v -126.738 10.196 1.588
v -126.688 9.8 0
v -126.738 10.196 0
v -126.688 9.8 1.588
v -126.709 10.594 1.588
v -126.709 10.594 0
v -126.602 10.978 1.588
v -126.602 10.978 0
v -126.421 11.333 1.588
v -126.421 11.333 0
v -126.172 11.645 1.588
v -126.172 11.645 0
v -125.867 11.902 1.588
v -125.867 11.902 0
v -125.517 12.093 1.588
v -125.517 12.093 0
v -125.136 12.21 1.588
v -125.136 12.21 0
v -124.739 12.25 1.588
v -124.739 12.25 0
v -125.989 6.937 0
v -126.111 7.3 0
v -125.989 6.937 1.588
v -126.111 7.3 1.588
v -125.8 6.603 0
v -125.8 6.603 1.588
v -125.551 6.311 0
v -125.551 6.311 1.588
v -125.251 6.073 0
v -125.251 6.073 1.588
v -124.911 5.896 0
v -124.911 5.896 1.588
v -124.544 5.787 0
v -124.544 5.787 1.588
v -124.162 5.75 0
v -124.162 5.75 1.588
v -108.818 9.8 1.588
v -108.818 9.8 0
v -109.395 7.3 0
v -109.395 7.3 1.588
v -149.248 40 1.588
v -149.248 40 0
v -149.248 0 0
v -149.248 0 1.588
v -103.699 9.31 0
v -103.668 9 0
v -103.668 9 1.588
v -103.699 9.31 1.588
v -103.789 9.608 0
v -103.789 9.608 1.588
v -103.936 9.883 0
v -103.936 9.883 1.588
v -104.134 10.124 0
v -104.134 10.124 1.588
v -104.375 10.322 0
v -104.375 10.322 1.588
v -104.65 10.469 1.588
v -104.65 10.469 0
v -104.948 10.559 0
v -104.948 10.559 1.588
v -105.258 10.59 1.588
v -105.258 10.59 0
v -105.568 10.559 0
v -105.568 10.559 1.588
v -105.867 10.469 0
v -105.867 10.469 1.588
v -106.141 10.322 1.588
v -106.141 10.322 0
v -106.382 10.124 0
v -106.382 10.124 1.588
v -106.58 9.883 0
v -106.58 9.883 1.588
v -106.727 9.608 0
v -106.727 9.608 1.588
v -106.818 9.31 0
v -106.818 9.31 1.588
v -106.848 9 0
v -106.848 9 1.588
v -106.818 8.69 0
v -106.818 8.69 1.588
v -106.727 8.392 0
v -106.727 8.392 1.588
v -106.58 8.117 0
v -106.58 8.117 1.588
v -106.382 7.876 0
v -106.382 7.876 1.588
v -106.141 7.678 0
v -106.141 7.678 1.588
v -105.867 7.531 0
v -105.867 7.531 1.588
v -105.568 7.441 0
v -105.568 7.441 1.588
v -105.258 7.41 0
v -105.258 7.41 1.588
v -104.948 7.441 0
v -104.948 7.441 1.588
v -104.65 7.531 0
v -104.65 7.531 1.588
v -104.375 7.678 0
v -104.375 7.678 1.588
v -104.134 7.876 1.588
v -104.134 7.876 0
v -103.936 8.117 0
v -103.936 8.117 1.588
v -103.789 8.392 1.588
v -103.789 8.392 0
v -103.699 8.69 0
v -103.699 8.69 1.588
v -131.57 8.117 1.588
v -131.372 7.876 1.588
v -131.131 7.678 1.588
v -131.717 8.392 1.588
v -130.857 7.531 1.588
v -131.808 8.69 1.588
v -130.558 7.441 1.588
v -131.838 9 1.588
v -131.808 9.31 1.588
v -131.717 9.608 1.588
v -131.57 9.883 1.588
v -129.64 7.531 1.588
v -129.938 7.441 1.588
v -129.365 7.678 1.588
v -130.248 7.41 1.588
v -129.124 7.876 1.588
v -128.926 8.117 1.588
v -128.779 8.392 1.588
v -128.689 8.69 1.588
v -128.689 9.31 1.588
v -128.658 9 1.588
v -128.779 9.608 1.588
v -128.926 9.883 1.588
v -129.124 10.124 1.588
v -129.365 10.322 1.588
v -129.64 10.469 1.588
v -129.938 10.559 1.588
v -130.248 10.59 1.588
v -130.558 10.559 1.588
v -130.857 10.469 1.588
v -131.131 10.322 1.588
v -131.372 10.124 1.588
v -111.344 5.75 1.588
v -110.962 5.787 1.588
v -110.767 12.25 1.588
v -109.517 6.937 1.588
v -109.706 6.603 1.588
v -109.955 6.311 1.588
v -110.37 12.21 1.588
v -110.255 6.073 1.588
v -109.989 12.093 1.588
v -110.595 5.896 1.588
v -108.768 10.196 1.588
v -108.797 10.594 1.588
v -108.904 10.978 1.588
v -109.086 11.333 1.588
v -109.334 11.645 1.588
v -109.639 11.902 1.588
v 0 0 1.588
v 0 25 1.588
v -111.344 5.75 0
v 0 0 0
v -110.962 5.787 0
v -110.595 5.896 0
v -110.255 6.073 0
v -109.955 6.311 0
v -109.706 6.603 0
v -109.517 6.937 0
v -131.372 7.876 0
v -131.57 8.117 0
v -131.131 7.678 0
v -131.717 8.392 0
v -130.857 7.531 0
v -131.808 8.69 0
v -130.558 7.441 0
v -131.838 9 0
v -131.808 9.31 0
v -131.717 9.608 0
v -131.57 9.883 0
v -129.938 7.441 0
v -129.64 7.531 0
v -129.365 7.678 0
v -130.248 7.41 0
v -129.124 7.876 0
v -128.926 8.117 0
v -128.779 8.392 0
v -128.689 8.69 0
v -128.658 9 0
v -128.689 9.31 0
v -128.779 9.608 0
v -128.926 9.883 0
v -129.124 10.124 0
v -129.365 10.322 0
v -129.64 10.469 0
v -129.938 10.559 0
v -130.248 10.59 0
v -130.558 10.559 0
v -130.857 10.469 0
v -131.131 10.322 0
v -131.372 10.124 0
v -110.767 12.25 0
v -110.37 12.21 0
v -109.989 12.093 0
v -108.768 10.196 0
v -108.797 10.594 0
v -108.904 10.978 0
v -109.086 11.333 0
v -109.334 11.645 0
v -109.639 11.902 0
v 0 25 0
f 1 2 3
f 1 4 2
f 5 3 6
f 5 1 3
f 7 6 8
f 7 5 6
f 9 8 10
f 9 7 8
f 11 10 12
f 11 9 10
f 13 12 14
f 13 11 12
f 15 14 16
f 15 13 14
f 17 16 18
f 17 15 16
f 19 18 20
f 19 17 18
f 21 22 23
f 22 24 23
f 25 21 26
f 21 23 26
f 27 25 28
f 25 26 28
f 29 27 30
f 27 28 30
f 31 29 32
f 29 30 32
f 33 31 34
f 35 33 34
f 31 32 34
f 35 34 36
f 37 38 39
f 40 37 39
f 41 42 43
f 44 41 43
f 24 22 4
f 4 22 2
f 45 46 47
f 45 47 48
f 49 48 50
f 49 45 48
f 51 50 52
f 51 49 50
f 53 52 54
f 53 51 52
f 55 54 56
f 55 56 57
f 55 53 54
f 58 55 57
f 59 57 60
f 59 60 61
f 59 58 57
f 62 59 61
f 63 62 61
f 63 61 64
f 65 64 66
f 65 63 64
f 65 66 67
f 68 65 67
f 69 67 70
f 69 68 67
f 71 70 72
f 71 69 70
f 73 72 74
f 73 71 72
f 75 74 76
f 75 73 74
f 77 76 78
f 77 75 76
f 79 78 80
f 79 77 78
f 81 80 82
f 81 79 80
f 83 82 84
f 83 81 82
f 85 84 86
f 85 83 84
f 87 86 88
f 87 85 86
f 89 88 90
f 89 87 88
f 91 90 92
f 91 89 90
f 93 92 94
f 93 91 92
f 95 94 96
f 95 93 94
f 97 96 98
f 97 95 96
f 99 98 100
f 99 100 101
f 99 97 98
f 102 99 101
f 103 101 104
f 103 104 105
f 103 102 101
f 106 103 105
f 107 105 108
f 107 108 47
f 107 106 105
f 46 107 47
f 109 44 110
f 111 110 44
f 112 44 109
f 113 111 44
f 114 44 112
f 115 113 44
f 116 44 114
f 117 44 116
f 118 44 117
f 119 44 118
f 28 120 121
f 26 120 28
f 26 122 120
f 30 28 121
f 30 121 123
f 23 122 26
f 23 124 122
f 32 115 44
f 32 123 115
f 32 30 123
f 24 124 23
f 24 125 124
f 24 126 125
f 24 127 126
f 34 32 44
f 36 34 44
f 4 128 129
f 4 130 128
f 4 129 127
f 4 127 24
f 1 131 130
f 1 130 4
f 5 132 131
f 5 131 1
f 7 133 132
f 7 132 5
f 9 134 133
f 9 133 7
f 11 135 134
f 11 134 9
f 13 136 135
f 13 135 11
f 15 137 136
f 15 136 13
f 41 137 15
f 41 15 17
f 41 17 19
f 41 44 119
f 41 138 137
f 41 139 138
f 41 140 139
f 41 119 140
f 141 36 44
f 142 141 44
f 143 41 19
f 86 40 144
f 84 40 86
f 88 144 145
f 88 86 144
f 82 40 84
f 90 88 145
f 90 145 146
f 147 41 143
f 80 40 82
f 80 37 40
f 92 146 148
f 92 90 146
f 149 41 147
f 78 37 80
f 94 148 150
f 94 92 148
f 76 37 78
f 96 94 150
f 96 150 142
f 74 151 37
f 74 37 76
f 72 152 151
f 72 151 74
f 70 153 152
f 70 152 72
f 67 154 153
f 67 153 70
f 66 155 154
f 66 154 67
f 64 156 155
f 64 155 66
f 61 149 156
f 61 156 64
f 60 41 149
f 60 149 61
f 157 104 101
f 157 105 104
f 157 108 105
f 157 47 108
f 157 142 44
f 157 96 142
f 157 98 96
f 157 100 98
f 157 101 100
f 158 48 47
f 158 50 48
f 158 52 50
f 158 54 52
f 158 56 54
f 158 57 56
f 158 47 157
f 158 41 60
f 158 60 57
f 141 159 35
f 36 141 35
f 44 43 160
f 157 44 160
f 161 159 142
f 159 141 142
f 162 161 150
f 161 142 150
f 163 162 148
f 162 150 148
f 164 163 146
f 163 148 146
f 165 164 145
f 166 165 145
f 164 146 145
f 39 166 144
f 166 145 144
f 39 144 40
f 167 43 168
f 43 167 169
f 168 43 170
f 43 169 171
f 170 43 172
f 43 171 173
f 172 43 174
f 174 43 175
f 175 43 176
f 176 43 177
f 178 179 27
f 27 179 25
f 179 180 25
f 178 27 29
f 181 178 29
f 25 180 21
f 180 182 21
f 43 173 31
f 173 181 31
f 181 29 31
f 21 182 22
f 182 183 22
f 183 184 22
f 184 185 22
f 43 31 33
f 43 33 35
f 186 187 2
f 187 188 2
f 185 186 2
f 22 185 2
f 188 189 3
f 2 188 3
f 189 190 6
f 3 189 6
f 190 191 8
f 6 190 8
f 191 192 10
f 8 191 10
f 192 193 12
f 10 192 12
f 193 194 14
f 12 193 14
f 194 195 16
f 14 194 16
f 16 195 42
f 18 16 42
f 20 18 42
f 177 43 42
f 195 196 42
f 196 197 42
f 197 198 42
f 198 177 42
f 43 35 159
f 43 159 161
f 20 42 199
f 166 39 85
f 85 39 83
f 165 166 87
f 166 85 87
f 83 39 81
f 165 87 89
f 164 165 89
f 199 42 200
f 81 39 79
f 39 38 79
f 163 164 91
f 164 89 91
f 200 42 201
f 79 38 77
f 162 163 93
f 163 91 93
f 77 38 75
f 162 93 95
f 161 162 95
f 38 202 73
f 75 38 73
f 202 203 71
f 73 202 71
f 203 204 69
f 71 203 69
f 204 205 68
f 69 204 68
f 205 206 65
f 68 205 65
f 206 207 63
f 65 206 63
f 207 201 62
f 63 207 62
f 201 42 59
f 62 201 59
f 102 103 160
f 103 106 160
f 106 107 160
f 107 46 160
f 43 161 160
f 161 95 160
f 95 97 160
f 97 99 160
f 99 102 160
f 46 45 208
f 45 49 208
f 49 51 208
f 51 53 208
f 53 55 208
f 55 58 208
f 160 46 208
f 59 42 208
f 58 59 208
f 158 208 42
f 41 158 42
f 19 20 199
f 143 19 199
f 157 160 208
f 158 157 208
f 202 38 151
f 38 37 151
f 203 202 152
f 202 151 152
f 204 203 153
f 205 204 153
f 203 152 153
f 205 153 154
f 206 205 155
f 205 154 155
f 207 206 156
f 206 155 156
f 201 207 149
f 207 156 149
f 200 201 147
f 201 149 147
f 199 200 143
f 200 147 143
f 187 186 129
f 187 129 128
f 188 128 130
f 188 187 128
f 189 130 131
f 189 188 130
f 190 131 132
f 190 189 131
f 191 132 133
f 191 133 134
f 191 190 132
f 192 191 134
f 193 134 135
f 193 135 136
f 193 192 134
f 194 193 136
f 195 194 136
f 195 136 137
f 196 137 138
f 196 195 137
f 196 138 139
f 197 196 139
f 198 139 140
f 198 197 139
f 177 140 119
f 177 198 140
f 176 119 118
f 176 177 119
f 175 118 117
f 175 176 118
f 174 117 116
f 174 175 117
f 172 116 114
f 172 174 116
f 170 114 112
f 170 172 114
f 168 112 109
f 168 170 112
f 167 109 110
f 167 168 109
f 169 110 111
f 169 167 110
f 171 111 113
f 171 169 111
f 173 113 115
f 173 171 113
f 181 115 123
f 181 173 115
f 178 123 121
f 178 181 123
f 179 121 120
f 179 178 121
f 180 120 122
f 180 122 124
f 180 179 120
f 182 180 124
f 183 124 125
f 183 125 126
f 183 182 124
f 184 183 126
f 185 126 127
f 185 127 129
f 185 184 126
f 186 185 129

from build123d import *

# Parameters (mm, degrees)
ESQUISSE1_R        = 1.59
BOSS_EXTRU_1_DEPTH = 1.5875
CONG_1_R           = 2


with BuildPart() as part:
    # Esquisse1 → Boss.-Extru.1 (new body)
    with BuildSketch(Plane.XY):
        Polygon((-149.248115566, 40), (-149.248115566, 0), (0, 0), (0, 25), align=None)
        with Locations((-130.248115566, 9)):
            Circle(ESQUISSE1_R, mode=Mode.SUBTRACT)
        with Locations((-105.258115566, 9)):
            Circle(ESQUISSE1_R, mode=Mode.SUBTRACT)
        Polygon((-127.253115566, 12.25), (-108.253115566, 12.25), (-109.753115566, 5.75), (-125.753115566, 5.75), align=None, mode=Mode.SUBTRACT)
    extrude(amount=BOSS_EXTRU_1_DEPTH)

    # Congé1
    cong_1_edges = [part.edges().sort_by_distance(p)[0] for p in [
        (-127.253115566, 12.25, 0.79375),
        (-125.753115566, 5.75, 0.79375),
        (-109.753115566, 5.75, 0.79375),
        (-108.253115566, 12.25, 0.79375),
    ]]
    fillet(cong_1_edges, radius=CONG_1_R)


solid = part.part
